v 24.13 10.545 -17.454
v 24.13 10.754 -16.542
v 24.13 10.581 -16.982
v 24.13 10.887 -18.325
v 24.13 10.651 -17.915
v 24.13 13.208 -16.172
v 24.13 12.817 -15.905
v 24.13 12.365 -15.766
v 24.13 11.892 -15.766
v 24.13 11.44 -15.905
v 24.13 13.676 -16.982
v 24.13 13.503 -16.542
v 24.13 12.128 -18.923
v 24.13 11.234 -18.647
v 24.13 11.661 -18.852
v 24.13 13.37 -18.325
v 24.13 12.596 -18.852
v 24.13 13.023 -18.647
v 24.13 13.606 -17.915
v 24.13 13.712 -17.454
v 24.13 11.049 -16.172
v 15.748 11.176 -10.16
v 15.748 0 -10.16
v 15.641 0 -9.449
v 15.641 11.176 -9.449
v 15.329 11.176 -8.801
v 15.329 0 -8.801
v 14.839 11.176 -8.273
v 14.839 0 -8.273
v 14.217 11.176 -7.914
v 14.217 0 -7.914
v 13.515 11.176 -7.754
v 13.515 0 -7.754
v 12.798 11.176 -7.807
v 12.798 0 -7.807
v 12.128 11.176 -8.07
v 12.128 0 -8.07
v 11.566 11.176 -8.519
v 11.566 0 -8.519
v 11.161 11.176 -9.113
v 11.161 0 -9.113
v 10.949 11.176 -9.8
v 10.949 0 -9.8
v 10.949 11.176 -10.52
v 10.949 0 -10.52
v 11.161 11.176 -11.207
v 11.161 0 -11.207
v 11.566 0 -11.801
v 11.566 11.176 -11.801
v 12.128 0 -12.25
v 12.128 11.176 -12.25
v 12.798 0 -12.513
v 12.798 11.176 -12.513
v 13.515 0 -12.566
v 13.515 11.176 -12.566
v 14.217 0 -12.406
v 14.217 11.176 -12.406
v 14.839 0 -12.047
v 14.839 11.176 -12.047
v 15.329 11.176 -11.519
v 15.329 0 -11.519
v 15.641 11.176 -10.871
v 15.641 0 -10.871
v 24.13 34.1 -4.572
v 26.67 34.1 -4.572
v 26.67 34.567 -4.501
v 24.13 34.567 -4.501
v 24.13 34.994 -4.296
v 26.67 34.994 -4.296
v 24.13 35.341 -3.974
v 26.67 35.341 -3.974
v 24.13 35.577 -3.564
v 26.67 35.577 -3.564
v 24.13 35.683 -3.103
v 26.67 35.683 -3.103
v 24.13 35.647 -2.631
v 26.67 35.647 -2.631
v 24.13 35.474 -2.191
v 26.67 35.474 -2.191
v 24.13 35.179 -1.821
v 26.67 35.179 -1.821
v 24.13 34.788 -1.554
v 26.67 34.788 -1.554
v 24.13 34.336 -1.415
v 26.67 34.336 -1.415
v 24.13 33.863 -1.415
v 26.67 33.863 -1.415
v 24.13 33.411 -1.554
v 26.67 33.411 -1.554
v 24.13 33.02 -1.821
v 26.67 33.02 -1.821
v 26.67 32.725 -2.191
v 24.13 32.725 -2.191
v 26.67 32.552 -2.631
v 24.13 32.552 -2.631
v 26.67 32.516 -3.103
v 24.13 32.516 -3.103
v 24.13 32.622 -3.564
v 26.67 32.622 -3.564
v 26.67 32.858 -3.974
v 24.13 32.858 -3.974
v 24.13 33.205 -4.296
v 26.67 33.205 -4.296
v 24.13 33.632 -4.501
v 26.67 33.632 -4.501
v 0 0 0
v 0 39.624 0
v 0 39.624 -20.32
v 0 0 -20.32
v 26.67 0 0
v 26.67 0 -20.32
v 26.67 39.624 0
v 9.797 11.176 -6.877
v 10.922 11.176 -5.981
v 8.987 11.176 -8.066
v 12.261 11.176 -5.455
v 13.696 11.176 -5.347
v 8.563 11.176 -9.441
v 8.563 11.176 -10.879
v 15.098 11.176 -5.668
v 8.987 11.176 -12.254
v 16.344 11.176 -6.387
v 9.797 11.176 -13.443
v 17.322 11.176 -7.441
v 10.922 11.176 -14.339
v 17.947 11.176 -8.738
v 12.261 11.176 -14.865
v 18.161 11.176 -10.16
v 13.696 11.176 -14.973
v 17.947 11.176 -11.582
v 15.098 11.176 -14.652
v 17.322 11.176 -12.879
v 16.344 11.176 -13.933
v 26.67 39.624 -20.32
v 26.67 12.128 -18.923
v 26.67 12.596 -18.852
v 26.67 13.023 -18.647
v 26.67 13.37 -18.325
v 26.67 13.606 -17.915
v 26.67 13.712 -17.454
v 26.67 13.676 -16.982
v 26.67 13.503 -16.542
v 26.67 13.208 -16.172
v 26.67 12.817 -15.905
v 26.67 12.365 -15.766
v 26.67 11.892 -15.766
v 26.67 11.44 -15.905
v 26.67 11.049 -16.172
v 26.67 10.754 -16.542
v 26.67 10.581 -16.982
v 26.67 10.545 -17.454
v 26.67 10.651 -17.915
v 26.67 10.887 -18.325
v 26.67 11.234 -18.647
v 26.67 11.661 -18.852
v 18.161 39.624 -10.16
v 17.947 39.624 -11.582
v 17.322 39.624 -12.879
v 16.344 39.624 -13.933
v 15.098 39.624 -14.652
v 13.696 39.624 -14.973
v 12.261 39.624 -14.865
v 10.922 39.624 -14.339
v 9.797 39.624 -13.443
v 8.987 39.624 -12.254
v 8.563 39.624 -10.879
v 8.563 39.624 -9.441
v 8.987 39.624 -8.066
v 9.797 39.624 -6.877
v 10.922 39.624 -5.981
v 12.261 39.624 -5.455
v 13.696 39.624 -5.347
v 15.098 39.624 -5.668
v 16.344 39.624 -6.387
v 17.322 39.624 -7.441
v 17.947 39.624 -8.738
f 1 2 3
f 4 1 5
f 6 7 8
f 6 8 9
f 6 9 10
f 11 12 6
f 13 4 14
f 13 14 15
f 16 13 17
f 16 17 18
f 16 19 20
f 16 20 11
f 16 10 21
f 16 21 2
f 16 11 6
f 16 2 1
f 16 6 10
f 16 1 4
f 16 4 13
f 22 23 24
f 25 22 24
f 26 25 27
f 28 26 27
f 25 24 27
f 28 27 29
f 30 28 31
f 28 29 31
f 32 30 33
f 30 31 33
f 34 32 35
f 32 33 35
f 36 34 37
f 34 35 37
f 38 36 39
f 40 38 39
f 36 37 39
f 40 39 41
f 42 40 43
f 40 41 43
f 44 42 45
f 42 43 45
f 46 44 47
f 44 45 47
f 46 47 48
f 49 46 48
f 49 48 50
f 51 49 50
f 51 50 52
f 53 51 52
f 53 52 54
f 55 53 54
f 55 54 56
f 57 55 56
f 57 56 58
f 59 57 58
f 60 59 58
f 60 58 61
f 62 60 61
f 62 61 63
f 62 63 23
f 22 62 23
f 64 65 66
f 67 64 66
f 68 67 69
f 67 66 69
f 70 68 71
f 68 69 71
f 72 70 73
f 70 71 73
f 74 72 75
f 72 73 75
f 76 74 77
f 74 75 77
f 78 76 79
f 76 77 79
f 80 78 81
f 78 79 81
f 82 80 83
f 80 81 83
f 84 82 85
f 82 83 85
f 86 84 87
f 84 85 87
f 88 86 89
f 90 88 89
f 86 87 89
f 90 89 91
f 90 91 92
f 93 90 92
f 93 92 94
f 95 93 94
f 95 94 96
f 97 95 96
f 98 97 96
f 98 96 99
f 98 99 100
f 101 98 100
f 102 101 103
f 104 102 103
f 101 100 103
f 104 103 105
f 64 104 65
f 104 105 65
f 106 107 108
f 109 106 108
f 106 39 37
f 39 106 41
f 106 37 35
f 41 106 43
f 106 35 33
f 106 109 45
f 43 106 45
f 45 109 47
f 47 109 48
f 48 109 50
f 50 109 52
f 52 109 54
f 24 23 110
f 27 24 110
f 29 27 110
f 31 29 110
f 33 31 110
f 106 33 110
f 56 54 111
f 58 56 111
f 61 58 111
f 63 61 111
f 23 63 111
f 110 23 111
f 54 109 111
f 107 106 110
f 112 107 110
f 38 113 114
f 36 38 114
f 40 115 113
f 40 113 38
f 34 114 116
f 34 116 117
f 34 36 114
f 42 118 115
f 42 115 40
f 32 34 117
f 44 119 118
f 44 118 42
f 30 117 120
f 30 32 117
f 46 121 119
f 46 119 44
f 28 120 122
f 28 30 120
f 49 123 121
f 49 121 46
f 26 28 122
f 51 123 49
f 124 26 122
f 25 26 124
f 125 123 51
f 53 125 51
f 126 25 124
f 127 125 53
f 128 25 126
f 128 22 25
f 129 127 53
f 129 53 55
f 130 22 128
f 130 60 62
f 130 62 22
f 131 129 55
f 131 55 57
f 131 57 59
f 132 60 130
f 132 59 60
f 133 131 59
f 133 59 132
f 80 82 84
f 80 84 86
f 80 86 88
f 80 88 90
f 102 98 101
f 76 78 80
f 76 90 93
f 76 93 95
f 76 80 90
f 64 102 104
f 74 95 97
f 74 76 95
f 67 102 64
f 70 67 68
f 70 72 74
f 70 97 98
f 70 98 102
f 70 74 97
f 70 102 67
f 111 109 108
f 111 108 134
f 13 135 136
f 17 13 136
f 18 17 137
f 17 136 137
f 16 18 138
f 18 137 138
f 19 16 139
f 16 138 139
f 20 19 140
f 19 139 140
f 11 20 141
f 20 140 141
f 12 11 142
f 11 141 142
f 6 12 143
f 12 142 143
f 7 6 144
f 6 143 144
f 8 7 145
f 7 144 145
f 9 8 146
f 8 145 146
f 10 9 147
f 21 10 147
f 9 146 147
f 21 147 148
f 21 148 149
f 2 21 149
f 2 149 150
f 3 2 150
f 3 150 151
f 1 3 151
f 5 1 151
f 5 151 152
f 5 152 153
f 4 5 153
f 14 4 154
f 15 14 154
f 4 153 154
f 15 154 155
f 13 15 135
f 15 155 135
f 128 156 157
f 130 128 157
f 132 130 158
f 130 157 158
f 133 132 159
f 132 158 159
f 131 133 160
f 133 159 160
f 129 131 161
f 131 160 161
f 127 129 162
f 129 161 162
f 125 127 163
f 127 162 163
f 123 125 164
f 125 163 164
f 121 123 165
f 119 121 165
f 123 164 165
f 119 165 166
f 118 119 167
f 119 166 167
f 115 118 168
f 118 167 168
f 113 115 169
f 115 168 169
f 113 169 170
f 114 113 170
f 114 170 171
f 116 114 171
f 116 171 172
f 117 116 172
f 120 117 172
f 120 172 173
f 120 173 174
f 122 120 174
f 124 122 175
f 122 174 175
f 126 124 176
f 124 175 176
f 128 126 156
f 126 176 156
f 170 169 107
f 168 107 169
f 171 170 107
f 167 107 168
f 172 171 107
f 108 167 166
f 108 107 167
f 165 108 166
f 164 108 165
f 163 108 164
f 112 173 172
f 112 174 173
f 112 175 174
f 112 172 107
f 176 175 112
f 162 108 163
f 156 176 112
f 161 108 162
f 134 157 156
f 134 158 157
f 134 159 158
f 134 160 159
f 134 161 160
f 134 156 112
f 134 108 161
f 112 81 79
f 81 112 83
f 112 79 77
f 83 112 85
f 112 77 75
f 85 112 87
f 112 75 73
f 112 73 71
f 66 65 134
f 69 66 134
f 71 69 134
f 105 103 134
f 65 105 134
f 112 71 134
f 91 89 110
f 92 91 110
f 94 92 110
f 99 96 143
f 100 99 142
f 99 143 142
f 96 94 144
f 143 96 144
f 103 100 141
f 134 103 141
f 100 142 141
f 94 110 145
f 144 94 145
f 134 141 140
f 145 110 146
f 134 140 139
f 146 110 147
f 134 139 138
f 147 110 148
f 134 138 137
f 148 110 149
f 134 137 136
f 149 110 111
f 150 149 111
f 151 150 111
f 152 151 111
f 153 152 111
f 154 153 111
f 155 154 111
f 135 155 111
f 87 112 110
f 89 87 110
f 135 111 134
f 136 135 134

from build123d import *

# Parameters (mm, degrees)
SKETCH1_W           = 26.67
SKETCH1_H           = 20.32
BOSS_EXTRUDE1_DEPTH = 39.624
SKETCH2_R           = 2.413
CUT_EXTRUDE1_DEPTH  = 40.624
SKETCH3_R           = 4.826
CUT_EXTRUDE2_DEPTH  = 28.448
SKETCH4_R           = 1.5875
CUT_EXTRUDE3_DEPTH  = 2.54


with BuildPart() as part:
    # Sketch1 → Boss-Extrude1 (new body)
    with BuildSketch(Plane(origin=(0, 0, 0), x_dir=(1, 0, 0), z_dir=(0, 1, 0))):
        with Locations((13.335, 10.16)):
            Rectangle(SKETCH1_W, SKETCH1_H)
    extrude(amount=BOSS_EXTRUDE1_DEPTH)

    # Sketch2 → Cut-Extrude1 (cut, through all)
    with BuildSketch(Plane.XZ):
        with Locations((13.335, -10.16)):
            Circle(SKETCH2_R)
    extrude(amount=-CUT_EXTRUDE1_DEPTH, mode=Mode.SUBTRACT)

    # Sketch3 → Cut-Extrude2 (cut)
    with BuildSketch(Plane(origin=(0, 39.624, 0), x_dir=(1, 0, 0), z_dir=(0, 1, 0))):
        with Locations((13.335, 10.16)):
            Circle(SKETCH3_R)
    extrude(amount=-CUT_EXTRUDE2_DEPTH, mode=Mode.SUBTRACT)

    # Sketch4 → Cut-Extrude3 (cut)
    with BuildSketch(Plane(origin=(26.67, 0, 0), x_dir=(0, 0, -1), z_dir=(1, 0, 0))):
        with Locations((2.9845, 34.0995)):
            Circle(SKETCH4_R)
        with Locations((17.3355, 12.1285)):
            Circle(SKETCH4_R)
    extrude(amount=-CUT_EXTRUDE3_DEPTH, mode=Mode.SUBTRACT)


solid = part.part
